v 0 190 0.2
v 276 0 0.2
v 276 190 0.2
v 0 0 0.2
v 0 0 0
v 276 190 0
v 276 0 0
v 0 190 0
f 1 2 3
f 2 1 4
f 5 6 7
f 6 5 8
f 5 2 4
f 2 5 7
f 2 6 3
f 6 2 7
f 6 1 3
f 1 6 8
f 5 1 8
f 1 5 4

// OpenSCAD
$fa=4; $fs=0.4;
color("#000000") translate([0.000,0.000,0.000]) cube([276.000,190.000,0.200]);
